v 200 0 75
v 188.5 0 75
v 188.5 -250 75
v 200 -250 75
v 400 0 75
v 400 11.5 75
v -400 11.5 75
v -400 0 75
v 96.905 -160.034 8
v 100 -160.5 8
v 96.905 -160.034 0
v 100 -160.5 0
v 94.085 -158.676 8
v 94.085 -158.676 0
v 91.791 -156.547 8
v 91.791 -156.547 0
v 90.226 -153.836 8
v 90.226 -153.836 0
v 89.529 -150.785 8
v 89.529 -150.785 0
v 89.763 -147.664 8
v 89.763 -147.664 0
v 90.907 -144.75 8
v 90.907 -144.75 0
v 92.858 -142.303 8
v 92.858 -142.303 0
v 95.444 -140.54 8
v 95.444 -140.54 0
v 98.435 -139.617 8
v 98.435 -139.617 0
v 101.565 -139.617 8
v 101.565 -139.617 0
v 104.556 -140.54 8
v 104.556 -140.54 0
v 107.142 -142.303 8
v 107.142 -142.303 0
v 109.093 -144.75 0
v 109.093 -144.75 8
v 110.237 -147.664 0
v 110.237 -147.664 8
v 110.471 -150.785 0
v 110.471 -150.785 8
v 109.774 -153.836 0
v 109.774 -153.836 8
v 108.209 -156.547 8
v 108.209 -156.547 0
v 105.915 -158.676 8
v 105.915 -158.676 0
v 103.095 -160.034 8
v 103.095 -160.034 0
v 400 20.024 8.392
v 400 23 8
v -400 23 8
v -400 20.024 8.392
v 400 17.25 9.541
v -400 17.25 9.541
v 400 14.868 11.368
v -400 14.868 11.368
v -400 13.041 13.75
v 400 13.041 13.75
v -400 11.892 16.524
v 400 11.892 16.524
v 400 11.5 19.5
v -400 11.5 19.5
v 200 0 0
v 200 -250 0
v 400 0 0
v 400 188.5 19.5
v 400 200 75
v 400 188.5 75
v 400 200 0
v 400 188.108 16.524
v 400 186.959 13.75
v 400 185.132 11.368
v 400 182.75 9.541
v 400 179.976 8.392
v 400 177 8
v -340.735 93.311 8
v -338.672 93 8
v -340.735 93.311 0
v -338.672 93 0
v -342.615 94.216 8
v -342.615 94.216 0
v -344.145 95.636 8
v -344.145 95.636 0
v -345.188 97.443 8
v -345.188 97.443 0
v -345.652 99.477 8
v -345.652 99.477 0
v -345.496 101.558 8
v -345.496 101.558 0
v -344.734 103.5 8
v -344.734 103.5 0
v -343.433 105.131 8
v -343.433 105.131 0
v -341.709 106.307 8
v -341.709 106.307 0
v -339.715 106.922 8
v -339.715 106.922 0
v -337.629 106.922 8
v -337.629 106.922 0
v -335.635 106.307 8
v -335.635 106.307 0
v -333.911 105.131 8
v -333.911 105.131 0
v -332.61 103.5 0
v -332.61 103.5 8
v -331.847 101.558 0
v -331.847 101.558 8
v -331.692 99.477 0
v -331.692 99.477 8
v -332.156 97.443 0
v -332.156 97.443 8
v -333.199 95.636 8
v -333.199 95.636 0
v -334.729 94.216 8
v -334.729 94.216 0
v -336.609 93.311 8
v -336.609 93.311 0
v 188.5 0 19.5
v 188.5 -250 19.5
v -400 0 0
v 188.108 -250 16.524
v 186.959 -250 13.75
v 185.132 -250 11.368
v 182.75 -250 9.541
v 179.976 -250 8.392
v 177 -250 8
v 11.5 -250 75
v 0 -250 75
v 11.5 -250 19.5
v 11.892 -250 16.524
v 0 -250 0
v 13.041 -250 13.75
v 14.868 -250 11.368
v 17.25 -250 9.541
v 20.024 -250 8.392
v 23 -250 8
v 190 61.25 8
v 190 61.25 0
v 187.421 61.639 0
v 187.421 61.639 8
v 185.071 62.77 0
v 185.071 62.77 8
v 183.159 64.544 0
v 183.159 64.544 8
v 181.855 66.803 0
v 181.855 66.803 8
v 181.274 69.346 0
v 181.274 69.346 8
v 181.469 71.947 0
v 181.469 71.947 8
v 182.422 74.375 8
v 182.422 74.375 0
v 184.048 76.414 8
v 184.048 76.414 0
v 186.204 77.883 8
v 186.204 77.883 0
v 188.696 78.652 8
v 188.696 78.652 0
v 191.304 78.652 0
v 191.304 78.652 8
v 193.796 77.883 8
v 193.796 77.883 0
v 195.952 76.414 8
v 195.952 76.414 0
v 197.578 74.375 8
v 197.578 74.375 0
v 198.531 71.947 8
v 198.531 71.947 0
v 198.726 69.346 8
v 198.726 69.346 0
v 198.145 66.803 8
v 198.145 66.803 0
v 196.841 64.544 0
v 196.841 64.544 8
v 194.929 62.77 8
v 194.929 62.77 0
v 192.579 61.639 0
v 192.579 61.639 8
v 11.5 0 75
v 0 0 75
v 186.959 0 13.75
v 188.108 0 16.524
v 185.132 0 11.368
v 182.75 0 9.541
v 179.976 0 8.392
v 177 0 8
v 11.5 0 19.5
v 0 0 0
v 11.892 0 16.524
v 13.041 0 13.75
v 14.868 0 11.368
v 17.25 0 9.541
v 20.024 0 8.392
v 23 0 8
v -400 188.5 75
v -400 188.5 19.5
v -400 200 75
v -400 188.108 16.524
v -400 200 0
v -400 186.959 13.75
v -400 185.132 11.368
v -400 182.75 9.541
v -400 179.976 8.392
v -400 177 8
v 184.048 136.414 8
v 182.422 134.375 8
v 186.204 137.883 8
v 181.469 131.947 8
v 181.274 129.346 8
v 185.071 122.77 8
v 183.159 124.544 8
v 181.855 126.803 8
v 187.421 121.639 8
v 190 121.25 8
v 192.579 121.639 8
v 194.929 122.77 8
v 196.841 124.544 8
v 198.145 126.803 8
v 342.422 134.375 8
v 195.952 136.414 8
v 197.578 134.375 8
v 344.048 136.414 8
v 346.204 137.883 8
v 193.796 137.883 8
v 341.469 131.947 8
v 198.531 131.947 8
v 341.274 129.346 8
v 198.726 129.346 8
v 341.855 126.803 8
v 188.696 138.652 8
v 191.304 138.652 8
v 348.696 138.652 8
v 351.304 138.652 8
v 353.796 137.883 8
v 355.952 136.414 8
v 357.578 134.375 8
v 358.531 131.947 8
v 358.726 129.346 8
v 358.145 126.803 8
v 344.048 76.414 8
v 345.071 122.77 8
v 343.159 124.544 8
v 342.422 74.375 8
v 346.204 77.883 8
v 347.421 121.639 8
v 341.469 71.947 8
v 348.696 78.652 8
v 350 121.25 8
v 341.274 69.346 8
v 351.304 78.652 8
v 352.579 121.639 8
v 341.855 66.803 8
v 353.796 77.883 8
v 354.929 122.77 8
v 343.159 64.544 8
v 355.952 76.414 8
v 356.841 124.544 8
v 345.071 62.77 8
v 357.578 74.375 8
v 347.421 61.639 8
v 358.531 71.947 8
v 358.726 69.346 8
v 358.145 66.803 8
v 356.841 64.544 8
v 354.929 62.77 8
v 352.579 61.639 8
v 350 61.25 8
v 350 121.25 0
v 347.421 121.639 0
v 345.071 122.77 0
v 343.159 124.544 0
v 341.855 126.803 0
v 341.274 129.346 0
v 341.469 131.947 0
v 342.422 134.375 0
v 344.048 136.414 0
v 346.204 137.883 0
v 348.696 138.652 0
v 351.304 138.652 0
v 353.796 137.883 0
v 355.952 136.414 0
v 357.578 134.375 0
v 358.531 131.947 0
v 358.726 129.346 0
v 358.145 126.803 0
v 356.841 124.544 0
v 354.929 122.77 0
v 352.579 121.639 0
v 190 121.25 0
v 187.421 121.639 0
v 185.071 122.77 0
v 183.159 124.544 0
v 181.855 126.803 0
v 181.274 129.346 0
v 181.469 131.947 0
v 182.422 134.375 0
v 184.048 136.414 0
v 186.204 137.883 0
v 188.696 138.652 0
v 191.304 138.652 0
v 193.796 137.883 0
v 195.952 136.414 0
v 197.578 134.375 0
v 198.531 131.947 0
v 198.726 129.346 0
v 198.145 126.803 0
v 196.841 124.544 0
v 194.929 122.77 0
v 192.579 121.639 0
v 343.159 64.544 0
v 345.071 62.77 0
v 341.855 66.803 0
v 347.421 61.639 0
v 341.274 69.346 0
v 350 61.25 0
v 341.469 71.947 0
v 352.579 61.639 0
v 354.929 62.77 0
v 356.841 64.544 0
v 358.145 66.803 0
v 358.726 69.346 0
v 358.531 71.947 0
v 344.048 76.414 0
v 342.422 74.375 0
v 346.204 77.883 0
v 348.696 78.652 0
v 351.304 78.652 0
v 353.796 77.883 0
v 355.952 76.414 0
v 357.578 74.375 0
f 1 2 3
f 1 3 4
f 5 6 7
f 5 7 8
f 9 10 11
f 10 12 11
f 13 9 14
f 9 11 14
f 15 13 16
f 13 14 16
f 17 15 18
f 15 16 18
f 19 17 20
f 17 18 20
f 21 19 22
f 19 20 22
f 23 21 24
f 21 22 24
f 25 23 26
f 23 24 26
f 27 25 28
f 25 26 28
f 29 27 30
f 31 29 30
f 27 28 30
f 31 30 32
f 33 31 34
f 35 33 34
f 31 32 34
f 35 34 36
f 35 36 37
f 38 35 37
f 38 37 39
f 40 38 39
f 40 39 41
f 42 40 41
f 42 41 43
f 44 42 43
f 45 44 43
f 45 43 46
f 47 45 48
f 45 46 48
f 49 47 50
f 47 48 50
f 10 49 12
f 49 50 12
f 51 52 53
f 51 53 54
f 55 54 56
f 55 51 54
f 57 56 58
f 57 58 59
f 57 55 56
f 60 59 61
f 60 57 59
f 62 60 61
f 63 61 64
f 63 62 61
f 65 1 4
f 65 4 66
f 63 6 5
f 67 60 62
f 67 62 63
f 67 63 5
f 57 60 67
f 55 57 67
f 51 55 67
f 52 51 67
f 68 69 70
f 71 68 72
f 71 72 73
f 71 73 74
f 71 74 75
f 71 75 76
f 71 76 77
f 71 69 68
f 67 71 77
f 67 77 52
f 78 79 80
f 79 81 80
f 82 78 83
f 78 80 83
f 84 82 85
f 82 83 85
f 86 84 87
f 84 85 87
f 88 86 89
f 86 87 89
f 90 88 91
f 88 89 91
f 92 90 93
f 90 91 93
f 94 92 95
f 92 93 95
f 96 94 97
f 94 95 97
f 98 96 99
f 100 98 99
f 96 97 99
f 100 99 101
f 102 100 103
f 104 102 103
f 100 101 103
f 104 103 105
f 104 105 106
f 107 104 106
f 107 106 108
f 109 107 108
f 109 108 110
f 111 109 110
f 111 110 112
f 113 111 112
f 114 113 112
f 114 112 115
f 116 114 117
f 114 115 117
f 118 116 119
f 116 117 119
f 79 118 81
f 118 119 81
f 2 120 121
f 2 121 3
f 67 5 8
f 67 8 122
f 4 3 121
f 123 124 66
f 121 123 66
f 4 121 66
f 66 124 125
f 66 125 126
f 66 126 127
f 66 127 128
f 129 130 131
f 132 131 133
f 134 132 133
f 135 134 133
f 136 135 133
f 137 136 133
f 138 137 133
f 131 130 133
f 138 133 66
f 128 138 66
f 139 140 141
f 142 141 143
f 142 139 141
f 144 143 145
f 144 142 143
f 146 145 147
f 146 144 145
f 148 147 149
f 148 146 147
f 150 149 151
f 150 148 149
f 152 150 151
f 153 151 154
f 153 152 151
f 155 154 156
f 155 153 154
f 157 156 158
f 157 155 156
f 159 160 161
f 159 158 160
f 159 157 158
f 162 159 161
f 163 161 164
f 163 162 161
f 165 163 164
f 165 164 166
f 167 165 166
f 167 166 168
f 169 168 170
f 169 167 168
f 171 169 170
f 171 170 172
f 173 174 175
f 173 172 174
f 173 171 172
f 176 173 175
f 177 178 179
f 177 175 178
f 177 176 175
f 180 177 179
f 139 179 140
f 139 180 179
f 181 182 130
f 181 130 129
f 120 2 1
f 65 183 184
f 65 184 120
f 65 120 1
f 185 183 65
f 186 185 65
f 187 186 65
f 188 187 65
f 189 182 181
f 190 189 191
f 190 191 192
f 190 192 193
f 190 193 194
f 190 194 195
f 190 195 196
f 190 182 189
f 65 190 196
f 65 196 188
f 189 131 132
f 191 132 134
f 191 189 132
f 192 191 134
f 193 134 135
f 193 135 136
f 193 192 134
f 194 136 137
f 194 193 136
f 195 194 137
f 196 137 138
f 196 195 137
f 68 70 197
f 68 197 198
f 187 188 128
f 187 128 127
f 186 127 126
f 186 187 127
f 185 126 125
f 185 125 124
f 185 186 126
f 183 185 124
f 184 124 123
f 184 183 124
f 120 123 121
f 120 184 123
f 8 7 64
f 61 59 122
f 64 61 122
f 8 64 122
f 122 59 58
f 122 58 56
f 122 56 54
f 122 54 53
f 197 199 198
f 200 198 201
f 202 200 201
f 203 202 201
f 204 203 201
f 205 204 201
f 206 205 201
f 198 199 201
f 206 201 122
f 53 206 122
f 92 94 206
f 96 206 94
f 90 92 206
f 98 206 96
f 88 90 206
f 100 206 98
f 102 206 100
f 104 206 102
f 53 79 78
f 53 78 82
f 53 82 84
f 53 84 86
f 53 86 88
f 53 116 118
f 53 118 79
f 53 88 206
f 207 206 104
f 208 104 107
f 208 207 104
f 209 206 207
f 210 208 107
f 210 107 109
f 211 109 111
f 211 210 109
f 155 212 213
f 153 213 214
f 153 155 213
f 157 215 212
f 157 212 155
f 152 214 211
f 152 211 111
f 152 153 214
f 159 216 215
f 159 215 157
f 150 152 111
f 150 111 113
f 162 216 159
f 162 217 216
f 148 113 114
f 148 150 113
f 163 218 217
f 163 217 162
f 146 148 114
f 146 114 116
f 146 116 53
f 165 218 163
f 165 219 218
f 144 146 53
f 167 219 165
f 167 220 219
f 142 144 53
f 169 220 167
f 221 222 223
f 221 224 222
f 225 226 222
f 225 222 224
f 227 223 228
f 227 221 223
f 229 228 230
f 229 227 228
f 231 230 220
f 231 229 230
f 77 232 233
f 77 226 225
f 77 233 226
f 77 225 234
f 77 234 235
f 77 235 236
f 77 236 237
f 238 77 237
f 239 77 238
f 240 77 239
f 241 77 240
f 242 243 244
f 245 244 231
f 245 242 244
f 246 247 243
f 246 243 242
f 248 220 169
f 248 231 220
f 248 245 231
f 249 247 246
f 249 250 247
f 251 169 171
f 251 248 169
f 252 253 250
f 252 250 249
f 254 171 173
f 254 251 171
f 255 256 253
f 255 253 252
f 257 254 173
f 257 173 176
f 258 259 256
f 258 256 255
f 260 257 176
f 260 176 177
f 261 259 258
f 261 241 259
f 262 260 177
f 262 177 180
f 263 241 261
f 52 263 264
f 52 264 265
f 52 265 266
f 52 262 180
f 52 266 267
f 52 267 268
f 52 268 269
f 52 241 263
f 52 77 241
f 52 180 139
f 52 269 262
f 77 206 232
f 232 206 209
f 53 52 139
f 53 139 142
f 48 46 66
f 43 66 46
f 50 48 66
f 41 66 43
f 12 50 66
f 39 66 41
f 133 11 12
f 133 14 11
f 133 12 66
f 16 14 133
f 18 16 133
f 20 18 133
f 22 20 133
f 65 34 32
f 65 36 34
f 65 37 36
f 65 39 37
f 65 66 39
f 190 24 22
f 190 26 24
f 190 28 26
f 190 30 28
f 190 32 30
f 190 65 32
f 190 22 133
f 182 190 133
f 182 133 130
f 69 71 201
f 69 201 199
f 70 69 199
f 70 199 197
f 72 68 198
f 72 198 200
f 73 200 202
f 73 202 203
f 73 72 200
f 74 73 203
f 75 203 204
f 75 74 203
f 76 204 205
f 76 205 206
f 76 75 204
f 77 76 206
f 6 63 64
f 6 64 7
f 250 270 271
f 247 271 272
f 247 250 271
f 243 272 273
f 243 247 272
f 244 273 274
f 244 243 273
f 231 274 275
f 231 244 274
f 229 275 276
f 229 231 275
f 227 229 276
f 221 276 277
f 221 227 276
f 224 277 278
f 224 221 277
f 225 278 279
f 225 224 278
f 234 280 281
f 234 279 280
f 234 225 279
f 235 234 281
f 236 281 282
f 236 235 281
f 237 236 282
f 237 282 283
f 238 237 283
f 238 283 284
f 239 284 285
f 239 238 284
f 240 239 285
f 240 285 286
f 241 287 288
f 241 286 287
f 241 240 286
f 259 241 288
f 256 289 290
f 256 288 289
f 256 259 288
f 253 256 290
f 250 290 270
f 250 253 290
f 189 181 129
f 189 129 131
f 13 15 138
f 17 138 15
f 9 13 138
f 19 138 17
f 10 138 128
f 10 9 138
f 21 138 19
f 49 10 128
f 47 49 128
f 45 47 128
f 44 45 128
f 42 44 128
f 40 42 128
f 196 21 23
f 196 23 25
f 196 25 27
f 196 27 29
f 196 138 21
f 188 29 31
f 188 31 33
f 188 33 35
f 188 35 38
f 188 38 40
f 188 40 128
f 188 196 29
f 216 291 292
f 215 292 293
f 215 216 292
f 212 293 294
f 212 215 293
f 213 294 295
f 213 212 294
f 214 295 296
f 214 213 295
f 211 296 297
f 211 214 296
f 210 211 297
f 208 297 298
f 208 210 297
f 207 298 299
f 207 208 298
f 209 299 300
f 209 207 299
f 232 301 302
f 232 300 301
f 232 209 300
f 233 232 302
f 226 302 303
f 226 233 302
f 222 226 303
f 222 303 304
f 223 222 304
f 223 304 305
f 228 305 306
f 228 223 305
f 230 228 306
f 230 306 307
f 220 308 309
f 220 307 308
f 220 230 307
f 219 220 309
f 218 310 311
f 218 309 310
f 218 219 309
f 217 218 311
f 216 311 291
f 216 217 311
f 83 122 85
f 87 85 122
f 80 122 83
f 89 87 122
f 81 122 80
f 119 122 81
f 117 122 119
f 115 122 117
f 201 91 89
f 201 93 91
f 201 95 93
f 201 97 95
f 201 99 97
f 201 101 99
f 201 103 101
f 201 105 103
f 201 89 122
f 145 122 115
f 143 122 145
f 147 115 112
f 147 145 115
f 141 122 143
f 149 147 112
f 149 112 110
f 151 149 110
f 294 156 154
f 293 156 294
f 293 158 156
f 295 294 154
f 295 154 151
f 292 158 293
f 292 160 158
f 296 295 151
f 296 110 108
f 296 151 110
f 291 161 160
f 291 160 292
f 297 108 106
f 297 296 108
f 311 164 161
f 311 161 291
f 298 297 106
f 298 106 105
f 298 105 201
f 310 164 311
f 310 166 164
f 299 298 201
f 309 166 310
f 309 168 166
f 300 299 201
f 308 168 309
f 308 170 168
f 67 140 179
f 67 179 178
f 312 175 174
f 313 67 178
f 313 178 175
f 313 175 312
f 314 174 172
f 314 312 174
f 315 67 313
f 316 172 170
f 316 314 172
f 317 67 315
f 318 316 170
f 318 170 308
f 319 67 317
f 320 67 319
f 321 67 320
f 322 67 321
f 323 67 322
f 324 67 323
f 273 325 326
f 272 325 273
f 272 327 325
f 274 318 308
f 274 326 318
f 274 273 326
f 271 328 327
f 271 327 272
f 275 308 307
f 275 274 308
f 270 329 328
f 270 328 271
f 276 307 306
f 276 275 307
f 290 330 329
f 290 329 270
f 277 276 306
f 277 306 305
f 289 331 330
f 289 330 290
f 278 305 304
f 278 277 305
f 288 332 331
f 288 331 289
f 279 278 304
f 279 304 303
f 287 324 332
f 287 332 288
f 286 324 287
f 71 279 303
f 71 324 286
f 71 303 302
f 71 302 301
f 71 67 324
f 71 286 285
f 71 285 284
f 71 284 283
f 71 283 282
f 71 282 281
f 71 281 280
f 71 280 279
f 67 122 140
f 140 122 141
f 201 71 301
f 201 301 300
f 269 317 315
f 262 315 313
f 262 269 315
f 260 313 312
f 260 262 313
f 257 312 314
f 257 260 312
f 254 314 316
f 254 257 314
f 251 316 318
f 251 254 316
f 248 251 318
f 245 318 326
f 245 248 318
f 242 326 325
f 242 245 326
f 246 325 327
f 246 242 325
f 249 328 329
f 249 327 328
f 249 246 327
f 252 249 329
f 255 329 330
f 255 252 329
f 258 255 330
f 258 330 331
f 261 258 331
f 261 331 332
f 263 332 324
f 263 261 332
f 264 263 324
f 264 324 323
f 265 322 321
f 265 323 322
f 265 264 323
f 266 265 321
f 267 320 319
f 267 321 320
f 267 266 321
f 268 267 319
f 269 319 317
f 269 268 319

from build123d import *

# Parameters (mm, degrees)
SQUARE_HSS_AL_CS_CHANNEL_SQR_END_4_X_2_0_DEPTH = 800
SQUARE_HSS_AL_CS_CHANNEL_SQR_END_4_X_2_DEPTH   = 250
SKETCH15_W                                     = 10.5
SKETCH15_H                                     = 8
SKETCH22_W                                     = 7
SKETCH22_H                                     = 8
M20X2_5_TAPPED_HOLE1_AT_2_COUNT                = 2
M20X2_5_TAPPED_HOLE1_AT_2_PITCH                = 160
M20X2_5_TAPPED_HOLE1_AT_3_COUNT                = 2
M20X2_5_TAPPED_HOLE1_AT_3_PITCH                = 170.880074906
M20X2_5_TAPPED_HOLE1_AT_4_COUNT                = 2
M20X2_5_TAPPED_HOLE1_AT_4_PITCH                = 60


with BuildPart() as part:
    # Sketch11 → Square hss AL CS CHANNEL SQR END 4 X 2.0 (new body)
    with BuildSketch(Plane.ZY.offset(-400)):
        with BuildLine():
            Line((0, 0), (0, 200))
            Line((0, 200), (75, 200))
            Line((75, 200), (75, 188.5))
            Line((75, 188.5), (19.5, 188.5))
            ThreePointArc((19.5, 188.5), (11.368272016, 185.131727984), (8, 177))
            Line((8, 177), (8, 23))
            ThreePointArc((8, 23), (11.368272016, 14.868272016), (19.5, 11.5))
            Line((19.5, 11.5), (75, 11.5))
            Line((75, 11.5), (75, 0))
            Line((75, 0), (0, 0))
        make_face()
    extrude(amount=SQUARE_HSS_AL_CS_CHANNEL_SQR_END_4_X_2_0_DEPTH)

    # Sketch22 → M20x2.0 Tapped Hole1 (revolve, cut)
    with BuildSketch(Plane(origin=(-338.671963182, 100, 8), x_dir=(0, -1, 0), z_dir=(1, 0, 0))):
        with Locations((3.5, 4)):
            Rectangle(SKETCH22_W, SKETCH22_H)
    revolve(axis=Axis((-338.671963182, 100, 14.35), (0, 0, -1)), mode=Mode.SUBTRACT)

    # Sketch26 → M20x2.5 Tapped Hole1 (revolve, cut)
    with BuildSketch(Plane(origin=(190, 130, 8), x_dir=(0, -1, 0), z_dir=(1, 0, 0))):
        Polygon((0, 0), (0, 52.757530416), (8.75, 47.5), (8.75, 0), align=None)
    m20x2_5_tapped_hole1 = revolve(axis=Axis((190, 130, 14.35), (0, 0, -1)), mode=Mode.SUBTRACT)

    # M20x2.5 Tapped Hole1 at 2: M20x2.5 Tapped Hole1 ×2
    with Locations(*[(i * M20X2_5_TAPPED_HOLE1_AT_2_PITCH, 0, 0) for i in range(1, M20X2_5_TAPPED_HOLE1_AT_2_COUNT)]):
        add(m20x2_5_tapped_hole1, mode=Mode.SUBTRACT)

    # M20x2.5 Tapped Hole1 at 3: M20x2.5 Tapped Hole1 ×2
    with Locations(*[Vector(0.9363291775690448, -0.35112344158839115, 0) * (i * M20X2_5_TAPPED_HOLE1_AT_3_PITCH) for i in range(1, M20X2_5_TAPPED_HOLE1_AT_3_COUNT)]):
        add(m20x2_5_tapped_hole1, mode=Mode.SUBTRACT)

    # M20x2.5 Tapped Hole1 at 4: M20x2.5 Tapped Hole1 ×2
    with Locations(*[(0, -i * M20X2_5_TAPPED_HOLE1_AT_4_PITCH, 0) for i in range(1, M20X2_5_TAPPED_HOLE1_AT_4_COUNT)]):
        add(m20x2_5_tapped_hole1, mode=Mode.SUBTRACT)


with BuildPart() as body_2:
    # Sketch12 → Square hss AL CS CHANNEL SQR END 4 X 2 (new body)
    with BuildSketch(Plane(origin=(200, 0, 0), x_dir=(0, 0, 1), z_dir=(0, -1, 0))):
        with BuildLine():
            Line((0, 0), (0, 200))
            Line((0, 200), (75, 200))
            Line((75, 200), (75, 188.5))
            Line((75, 188.5), (19.5, 188.5))
            ThreePointArc((19.5, 188.5), (11.368272016, 185.131727984), (8, 177))
            Line((8, 177), (8, 23))
            ThreePointArc((8, 23), (11.368272016, 14.868272016), (19.5, 11.5))
            Line((19.5, 11.5), (75, 11.5))
            Line((75, 11.5), (75, 0))
            Line((75, 0), (0, 0))
        make_face()
    extrude(amount=SQUARE_HSS_AL_CS_CHANNEL_SQR_END_4_X_2_DEPTH)

    # Sketch15 → M24x3.0 Tapped Hole1 (revolve, cut)
    with BuildSketch(Plane(origin=(100, -150, 8), x_dir=(0, -1, 0), z_dir=(1, 0, 0))):
        with Locations((5.25, 4)):
            Rectangle(SKETCH15_W, SKETCH15_H)
    revolve(axis=Axis((100, -150, 14.35), (0, 0, -1)), mode=Mode.SUBTRACT)


solid = Compound([part.part, body_2.part])
